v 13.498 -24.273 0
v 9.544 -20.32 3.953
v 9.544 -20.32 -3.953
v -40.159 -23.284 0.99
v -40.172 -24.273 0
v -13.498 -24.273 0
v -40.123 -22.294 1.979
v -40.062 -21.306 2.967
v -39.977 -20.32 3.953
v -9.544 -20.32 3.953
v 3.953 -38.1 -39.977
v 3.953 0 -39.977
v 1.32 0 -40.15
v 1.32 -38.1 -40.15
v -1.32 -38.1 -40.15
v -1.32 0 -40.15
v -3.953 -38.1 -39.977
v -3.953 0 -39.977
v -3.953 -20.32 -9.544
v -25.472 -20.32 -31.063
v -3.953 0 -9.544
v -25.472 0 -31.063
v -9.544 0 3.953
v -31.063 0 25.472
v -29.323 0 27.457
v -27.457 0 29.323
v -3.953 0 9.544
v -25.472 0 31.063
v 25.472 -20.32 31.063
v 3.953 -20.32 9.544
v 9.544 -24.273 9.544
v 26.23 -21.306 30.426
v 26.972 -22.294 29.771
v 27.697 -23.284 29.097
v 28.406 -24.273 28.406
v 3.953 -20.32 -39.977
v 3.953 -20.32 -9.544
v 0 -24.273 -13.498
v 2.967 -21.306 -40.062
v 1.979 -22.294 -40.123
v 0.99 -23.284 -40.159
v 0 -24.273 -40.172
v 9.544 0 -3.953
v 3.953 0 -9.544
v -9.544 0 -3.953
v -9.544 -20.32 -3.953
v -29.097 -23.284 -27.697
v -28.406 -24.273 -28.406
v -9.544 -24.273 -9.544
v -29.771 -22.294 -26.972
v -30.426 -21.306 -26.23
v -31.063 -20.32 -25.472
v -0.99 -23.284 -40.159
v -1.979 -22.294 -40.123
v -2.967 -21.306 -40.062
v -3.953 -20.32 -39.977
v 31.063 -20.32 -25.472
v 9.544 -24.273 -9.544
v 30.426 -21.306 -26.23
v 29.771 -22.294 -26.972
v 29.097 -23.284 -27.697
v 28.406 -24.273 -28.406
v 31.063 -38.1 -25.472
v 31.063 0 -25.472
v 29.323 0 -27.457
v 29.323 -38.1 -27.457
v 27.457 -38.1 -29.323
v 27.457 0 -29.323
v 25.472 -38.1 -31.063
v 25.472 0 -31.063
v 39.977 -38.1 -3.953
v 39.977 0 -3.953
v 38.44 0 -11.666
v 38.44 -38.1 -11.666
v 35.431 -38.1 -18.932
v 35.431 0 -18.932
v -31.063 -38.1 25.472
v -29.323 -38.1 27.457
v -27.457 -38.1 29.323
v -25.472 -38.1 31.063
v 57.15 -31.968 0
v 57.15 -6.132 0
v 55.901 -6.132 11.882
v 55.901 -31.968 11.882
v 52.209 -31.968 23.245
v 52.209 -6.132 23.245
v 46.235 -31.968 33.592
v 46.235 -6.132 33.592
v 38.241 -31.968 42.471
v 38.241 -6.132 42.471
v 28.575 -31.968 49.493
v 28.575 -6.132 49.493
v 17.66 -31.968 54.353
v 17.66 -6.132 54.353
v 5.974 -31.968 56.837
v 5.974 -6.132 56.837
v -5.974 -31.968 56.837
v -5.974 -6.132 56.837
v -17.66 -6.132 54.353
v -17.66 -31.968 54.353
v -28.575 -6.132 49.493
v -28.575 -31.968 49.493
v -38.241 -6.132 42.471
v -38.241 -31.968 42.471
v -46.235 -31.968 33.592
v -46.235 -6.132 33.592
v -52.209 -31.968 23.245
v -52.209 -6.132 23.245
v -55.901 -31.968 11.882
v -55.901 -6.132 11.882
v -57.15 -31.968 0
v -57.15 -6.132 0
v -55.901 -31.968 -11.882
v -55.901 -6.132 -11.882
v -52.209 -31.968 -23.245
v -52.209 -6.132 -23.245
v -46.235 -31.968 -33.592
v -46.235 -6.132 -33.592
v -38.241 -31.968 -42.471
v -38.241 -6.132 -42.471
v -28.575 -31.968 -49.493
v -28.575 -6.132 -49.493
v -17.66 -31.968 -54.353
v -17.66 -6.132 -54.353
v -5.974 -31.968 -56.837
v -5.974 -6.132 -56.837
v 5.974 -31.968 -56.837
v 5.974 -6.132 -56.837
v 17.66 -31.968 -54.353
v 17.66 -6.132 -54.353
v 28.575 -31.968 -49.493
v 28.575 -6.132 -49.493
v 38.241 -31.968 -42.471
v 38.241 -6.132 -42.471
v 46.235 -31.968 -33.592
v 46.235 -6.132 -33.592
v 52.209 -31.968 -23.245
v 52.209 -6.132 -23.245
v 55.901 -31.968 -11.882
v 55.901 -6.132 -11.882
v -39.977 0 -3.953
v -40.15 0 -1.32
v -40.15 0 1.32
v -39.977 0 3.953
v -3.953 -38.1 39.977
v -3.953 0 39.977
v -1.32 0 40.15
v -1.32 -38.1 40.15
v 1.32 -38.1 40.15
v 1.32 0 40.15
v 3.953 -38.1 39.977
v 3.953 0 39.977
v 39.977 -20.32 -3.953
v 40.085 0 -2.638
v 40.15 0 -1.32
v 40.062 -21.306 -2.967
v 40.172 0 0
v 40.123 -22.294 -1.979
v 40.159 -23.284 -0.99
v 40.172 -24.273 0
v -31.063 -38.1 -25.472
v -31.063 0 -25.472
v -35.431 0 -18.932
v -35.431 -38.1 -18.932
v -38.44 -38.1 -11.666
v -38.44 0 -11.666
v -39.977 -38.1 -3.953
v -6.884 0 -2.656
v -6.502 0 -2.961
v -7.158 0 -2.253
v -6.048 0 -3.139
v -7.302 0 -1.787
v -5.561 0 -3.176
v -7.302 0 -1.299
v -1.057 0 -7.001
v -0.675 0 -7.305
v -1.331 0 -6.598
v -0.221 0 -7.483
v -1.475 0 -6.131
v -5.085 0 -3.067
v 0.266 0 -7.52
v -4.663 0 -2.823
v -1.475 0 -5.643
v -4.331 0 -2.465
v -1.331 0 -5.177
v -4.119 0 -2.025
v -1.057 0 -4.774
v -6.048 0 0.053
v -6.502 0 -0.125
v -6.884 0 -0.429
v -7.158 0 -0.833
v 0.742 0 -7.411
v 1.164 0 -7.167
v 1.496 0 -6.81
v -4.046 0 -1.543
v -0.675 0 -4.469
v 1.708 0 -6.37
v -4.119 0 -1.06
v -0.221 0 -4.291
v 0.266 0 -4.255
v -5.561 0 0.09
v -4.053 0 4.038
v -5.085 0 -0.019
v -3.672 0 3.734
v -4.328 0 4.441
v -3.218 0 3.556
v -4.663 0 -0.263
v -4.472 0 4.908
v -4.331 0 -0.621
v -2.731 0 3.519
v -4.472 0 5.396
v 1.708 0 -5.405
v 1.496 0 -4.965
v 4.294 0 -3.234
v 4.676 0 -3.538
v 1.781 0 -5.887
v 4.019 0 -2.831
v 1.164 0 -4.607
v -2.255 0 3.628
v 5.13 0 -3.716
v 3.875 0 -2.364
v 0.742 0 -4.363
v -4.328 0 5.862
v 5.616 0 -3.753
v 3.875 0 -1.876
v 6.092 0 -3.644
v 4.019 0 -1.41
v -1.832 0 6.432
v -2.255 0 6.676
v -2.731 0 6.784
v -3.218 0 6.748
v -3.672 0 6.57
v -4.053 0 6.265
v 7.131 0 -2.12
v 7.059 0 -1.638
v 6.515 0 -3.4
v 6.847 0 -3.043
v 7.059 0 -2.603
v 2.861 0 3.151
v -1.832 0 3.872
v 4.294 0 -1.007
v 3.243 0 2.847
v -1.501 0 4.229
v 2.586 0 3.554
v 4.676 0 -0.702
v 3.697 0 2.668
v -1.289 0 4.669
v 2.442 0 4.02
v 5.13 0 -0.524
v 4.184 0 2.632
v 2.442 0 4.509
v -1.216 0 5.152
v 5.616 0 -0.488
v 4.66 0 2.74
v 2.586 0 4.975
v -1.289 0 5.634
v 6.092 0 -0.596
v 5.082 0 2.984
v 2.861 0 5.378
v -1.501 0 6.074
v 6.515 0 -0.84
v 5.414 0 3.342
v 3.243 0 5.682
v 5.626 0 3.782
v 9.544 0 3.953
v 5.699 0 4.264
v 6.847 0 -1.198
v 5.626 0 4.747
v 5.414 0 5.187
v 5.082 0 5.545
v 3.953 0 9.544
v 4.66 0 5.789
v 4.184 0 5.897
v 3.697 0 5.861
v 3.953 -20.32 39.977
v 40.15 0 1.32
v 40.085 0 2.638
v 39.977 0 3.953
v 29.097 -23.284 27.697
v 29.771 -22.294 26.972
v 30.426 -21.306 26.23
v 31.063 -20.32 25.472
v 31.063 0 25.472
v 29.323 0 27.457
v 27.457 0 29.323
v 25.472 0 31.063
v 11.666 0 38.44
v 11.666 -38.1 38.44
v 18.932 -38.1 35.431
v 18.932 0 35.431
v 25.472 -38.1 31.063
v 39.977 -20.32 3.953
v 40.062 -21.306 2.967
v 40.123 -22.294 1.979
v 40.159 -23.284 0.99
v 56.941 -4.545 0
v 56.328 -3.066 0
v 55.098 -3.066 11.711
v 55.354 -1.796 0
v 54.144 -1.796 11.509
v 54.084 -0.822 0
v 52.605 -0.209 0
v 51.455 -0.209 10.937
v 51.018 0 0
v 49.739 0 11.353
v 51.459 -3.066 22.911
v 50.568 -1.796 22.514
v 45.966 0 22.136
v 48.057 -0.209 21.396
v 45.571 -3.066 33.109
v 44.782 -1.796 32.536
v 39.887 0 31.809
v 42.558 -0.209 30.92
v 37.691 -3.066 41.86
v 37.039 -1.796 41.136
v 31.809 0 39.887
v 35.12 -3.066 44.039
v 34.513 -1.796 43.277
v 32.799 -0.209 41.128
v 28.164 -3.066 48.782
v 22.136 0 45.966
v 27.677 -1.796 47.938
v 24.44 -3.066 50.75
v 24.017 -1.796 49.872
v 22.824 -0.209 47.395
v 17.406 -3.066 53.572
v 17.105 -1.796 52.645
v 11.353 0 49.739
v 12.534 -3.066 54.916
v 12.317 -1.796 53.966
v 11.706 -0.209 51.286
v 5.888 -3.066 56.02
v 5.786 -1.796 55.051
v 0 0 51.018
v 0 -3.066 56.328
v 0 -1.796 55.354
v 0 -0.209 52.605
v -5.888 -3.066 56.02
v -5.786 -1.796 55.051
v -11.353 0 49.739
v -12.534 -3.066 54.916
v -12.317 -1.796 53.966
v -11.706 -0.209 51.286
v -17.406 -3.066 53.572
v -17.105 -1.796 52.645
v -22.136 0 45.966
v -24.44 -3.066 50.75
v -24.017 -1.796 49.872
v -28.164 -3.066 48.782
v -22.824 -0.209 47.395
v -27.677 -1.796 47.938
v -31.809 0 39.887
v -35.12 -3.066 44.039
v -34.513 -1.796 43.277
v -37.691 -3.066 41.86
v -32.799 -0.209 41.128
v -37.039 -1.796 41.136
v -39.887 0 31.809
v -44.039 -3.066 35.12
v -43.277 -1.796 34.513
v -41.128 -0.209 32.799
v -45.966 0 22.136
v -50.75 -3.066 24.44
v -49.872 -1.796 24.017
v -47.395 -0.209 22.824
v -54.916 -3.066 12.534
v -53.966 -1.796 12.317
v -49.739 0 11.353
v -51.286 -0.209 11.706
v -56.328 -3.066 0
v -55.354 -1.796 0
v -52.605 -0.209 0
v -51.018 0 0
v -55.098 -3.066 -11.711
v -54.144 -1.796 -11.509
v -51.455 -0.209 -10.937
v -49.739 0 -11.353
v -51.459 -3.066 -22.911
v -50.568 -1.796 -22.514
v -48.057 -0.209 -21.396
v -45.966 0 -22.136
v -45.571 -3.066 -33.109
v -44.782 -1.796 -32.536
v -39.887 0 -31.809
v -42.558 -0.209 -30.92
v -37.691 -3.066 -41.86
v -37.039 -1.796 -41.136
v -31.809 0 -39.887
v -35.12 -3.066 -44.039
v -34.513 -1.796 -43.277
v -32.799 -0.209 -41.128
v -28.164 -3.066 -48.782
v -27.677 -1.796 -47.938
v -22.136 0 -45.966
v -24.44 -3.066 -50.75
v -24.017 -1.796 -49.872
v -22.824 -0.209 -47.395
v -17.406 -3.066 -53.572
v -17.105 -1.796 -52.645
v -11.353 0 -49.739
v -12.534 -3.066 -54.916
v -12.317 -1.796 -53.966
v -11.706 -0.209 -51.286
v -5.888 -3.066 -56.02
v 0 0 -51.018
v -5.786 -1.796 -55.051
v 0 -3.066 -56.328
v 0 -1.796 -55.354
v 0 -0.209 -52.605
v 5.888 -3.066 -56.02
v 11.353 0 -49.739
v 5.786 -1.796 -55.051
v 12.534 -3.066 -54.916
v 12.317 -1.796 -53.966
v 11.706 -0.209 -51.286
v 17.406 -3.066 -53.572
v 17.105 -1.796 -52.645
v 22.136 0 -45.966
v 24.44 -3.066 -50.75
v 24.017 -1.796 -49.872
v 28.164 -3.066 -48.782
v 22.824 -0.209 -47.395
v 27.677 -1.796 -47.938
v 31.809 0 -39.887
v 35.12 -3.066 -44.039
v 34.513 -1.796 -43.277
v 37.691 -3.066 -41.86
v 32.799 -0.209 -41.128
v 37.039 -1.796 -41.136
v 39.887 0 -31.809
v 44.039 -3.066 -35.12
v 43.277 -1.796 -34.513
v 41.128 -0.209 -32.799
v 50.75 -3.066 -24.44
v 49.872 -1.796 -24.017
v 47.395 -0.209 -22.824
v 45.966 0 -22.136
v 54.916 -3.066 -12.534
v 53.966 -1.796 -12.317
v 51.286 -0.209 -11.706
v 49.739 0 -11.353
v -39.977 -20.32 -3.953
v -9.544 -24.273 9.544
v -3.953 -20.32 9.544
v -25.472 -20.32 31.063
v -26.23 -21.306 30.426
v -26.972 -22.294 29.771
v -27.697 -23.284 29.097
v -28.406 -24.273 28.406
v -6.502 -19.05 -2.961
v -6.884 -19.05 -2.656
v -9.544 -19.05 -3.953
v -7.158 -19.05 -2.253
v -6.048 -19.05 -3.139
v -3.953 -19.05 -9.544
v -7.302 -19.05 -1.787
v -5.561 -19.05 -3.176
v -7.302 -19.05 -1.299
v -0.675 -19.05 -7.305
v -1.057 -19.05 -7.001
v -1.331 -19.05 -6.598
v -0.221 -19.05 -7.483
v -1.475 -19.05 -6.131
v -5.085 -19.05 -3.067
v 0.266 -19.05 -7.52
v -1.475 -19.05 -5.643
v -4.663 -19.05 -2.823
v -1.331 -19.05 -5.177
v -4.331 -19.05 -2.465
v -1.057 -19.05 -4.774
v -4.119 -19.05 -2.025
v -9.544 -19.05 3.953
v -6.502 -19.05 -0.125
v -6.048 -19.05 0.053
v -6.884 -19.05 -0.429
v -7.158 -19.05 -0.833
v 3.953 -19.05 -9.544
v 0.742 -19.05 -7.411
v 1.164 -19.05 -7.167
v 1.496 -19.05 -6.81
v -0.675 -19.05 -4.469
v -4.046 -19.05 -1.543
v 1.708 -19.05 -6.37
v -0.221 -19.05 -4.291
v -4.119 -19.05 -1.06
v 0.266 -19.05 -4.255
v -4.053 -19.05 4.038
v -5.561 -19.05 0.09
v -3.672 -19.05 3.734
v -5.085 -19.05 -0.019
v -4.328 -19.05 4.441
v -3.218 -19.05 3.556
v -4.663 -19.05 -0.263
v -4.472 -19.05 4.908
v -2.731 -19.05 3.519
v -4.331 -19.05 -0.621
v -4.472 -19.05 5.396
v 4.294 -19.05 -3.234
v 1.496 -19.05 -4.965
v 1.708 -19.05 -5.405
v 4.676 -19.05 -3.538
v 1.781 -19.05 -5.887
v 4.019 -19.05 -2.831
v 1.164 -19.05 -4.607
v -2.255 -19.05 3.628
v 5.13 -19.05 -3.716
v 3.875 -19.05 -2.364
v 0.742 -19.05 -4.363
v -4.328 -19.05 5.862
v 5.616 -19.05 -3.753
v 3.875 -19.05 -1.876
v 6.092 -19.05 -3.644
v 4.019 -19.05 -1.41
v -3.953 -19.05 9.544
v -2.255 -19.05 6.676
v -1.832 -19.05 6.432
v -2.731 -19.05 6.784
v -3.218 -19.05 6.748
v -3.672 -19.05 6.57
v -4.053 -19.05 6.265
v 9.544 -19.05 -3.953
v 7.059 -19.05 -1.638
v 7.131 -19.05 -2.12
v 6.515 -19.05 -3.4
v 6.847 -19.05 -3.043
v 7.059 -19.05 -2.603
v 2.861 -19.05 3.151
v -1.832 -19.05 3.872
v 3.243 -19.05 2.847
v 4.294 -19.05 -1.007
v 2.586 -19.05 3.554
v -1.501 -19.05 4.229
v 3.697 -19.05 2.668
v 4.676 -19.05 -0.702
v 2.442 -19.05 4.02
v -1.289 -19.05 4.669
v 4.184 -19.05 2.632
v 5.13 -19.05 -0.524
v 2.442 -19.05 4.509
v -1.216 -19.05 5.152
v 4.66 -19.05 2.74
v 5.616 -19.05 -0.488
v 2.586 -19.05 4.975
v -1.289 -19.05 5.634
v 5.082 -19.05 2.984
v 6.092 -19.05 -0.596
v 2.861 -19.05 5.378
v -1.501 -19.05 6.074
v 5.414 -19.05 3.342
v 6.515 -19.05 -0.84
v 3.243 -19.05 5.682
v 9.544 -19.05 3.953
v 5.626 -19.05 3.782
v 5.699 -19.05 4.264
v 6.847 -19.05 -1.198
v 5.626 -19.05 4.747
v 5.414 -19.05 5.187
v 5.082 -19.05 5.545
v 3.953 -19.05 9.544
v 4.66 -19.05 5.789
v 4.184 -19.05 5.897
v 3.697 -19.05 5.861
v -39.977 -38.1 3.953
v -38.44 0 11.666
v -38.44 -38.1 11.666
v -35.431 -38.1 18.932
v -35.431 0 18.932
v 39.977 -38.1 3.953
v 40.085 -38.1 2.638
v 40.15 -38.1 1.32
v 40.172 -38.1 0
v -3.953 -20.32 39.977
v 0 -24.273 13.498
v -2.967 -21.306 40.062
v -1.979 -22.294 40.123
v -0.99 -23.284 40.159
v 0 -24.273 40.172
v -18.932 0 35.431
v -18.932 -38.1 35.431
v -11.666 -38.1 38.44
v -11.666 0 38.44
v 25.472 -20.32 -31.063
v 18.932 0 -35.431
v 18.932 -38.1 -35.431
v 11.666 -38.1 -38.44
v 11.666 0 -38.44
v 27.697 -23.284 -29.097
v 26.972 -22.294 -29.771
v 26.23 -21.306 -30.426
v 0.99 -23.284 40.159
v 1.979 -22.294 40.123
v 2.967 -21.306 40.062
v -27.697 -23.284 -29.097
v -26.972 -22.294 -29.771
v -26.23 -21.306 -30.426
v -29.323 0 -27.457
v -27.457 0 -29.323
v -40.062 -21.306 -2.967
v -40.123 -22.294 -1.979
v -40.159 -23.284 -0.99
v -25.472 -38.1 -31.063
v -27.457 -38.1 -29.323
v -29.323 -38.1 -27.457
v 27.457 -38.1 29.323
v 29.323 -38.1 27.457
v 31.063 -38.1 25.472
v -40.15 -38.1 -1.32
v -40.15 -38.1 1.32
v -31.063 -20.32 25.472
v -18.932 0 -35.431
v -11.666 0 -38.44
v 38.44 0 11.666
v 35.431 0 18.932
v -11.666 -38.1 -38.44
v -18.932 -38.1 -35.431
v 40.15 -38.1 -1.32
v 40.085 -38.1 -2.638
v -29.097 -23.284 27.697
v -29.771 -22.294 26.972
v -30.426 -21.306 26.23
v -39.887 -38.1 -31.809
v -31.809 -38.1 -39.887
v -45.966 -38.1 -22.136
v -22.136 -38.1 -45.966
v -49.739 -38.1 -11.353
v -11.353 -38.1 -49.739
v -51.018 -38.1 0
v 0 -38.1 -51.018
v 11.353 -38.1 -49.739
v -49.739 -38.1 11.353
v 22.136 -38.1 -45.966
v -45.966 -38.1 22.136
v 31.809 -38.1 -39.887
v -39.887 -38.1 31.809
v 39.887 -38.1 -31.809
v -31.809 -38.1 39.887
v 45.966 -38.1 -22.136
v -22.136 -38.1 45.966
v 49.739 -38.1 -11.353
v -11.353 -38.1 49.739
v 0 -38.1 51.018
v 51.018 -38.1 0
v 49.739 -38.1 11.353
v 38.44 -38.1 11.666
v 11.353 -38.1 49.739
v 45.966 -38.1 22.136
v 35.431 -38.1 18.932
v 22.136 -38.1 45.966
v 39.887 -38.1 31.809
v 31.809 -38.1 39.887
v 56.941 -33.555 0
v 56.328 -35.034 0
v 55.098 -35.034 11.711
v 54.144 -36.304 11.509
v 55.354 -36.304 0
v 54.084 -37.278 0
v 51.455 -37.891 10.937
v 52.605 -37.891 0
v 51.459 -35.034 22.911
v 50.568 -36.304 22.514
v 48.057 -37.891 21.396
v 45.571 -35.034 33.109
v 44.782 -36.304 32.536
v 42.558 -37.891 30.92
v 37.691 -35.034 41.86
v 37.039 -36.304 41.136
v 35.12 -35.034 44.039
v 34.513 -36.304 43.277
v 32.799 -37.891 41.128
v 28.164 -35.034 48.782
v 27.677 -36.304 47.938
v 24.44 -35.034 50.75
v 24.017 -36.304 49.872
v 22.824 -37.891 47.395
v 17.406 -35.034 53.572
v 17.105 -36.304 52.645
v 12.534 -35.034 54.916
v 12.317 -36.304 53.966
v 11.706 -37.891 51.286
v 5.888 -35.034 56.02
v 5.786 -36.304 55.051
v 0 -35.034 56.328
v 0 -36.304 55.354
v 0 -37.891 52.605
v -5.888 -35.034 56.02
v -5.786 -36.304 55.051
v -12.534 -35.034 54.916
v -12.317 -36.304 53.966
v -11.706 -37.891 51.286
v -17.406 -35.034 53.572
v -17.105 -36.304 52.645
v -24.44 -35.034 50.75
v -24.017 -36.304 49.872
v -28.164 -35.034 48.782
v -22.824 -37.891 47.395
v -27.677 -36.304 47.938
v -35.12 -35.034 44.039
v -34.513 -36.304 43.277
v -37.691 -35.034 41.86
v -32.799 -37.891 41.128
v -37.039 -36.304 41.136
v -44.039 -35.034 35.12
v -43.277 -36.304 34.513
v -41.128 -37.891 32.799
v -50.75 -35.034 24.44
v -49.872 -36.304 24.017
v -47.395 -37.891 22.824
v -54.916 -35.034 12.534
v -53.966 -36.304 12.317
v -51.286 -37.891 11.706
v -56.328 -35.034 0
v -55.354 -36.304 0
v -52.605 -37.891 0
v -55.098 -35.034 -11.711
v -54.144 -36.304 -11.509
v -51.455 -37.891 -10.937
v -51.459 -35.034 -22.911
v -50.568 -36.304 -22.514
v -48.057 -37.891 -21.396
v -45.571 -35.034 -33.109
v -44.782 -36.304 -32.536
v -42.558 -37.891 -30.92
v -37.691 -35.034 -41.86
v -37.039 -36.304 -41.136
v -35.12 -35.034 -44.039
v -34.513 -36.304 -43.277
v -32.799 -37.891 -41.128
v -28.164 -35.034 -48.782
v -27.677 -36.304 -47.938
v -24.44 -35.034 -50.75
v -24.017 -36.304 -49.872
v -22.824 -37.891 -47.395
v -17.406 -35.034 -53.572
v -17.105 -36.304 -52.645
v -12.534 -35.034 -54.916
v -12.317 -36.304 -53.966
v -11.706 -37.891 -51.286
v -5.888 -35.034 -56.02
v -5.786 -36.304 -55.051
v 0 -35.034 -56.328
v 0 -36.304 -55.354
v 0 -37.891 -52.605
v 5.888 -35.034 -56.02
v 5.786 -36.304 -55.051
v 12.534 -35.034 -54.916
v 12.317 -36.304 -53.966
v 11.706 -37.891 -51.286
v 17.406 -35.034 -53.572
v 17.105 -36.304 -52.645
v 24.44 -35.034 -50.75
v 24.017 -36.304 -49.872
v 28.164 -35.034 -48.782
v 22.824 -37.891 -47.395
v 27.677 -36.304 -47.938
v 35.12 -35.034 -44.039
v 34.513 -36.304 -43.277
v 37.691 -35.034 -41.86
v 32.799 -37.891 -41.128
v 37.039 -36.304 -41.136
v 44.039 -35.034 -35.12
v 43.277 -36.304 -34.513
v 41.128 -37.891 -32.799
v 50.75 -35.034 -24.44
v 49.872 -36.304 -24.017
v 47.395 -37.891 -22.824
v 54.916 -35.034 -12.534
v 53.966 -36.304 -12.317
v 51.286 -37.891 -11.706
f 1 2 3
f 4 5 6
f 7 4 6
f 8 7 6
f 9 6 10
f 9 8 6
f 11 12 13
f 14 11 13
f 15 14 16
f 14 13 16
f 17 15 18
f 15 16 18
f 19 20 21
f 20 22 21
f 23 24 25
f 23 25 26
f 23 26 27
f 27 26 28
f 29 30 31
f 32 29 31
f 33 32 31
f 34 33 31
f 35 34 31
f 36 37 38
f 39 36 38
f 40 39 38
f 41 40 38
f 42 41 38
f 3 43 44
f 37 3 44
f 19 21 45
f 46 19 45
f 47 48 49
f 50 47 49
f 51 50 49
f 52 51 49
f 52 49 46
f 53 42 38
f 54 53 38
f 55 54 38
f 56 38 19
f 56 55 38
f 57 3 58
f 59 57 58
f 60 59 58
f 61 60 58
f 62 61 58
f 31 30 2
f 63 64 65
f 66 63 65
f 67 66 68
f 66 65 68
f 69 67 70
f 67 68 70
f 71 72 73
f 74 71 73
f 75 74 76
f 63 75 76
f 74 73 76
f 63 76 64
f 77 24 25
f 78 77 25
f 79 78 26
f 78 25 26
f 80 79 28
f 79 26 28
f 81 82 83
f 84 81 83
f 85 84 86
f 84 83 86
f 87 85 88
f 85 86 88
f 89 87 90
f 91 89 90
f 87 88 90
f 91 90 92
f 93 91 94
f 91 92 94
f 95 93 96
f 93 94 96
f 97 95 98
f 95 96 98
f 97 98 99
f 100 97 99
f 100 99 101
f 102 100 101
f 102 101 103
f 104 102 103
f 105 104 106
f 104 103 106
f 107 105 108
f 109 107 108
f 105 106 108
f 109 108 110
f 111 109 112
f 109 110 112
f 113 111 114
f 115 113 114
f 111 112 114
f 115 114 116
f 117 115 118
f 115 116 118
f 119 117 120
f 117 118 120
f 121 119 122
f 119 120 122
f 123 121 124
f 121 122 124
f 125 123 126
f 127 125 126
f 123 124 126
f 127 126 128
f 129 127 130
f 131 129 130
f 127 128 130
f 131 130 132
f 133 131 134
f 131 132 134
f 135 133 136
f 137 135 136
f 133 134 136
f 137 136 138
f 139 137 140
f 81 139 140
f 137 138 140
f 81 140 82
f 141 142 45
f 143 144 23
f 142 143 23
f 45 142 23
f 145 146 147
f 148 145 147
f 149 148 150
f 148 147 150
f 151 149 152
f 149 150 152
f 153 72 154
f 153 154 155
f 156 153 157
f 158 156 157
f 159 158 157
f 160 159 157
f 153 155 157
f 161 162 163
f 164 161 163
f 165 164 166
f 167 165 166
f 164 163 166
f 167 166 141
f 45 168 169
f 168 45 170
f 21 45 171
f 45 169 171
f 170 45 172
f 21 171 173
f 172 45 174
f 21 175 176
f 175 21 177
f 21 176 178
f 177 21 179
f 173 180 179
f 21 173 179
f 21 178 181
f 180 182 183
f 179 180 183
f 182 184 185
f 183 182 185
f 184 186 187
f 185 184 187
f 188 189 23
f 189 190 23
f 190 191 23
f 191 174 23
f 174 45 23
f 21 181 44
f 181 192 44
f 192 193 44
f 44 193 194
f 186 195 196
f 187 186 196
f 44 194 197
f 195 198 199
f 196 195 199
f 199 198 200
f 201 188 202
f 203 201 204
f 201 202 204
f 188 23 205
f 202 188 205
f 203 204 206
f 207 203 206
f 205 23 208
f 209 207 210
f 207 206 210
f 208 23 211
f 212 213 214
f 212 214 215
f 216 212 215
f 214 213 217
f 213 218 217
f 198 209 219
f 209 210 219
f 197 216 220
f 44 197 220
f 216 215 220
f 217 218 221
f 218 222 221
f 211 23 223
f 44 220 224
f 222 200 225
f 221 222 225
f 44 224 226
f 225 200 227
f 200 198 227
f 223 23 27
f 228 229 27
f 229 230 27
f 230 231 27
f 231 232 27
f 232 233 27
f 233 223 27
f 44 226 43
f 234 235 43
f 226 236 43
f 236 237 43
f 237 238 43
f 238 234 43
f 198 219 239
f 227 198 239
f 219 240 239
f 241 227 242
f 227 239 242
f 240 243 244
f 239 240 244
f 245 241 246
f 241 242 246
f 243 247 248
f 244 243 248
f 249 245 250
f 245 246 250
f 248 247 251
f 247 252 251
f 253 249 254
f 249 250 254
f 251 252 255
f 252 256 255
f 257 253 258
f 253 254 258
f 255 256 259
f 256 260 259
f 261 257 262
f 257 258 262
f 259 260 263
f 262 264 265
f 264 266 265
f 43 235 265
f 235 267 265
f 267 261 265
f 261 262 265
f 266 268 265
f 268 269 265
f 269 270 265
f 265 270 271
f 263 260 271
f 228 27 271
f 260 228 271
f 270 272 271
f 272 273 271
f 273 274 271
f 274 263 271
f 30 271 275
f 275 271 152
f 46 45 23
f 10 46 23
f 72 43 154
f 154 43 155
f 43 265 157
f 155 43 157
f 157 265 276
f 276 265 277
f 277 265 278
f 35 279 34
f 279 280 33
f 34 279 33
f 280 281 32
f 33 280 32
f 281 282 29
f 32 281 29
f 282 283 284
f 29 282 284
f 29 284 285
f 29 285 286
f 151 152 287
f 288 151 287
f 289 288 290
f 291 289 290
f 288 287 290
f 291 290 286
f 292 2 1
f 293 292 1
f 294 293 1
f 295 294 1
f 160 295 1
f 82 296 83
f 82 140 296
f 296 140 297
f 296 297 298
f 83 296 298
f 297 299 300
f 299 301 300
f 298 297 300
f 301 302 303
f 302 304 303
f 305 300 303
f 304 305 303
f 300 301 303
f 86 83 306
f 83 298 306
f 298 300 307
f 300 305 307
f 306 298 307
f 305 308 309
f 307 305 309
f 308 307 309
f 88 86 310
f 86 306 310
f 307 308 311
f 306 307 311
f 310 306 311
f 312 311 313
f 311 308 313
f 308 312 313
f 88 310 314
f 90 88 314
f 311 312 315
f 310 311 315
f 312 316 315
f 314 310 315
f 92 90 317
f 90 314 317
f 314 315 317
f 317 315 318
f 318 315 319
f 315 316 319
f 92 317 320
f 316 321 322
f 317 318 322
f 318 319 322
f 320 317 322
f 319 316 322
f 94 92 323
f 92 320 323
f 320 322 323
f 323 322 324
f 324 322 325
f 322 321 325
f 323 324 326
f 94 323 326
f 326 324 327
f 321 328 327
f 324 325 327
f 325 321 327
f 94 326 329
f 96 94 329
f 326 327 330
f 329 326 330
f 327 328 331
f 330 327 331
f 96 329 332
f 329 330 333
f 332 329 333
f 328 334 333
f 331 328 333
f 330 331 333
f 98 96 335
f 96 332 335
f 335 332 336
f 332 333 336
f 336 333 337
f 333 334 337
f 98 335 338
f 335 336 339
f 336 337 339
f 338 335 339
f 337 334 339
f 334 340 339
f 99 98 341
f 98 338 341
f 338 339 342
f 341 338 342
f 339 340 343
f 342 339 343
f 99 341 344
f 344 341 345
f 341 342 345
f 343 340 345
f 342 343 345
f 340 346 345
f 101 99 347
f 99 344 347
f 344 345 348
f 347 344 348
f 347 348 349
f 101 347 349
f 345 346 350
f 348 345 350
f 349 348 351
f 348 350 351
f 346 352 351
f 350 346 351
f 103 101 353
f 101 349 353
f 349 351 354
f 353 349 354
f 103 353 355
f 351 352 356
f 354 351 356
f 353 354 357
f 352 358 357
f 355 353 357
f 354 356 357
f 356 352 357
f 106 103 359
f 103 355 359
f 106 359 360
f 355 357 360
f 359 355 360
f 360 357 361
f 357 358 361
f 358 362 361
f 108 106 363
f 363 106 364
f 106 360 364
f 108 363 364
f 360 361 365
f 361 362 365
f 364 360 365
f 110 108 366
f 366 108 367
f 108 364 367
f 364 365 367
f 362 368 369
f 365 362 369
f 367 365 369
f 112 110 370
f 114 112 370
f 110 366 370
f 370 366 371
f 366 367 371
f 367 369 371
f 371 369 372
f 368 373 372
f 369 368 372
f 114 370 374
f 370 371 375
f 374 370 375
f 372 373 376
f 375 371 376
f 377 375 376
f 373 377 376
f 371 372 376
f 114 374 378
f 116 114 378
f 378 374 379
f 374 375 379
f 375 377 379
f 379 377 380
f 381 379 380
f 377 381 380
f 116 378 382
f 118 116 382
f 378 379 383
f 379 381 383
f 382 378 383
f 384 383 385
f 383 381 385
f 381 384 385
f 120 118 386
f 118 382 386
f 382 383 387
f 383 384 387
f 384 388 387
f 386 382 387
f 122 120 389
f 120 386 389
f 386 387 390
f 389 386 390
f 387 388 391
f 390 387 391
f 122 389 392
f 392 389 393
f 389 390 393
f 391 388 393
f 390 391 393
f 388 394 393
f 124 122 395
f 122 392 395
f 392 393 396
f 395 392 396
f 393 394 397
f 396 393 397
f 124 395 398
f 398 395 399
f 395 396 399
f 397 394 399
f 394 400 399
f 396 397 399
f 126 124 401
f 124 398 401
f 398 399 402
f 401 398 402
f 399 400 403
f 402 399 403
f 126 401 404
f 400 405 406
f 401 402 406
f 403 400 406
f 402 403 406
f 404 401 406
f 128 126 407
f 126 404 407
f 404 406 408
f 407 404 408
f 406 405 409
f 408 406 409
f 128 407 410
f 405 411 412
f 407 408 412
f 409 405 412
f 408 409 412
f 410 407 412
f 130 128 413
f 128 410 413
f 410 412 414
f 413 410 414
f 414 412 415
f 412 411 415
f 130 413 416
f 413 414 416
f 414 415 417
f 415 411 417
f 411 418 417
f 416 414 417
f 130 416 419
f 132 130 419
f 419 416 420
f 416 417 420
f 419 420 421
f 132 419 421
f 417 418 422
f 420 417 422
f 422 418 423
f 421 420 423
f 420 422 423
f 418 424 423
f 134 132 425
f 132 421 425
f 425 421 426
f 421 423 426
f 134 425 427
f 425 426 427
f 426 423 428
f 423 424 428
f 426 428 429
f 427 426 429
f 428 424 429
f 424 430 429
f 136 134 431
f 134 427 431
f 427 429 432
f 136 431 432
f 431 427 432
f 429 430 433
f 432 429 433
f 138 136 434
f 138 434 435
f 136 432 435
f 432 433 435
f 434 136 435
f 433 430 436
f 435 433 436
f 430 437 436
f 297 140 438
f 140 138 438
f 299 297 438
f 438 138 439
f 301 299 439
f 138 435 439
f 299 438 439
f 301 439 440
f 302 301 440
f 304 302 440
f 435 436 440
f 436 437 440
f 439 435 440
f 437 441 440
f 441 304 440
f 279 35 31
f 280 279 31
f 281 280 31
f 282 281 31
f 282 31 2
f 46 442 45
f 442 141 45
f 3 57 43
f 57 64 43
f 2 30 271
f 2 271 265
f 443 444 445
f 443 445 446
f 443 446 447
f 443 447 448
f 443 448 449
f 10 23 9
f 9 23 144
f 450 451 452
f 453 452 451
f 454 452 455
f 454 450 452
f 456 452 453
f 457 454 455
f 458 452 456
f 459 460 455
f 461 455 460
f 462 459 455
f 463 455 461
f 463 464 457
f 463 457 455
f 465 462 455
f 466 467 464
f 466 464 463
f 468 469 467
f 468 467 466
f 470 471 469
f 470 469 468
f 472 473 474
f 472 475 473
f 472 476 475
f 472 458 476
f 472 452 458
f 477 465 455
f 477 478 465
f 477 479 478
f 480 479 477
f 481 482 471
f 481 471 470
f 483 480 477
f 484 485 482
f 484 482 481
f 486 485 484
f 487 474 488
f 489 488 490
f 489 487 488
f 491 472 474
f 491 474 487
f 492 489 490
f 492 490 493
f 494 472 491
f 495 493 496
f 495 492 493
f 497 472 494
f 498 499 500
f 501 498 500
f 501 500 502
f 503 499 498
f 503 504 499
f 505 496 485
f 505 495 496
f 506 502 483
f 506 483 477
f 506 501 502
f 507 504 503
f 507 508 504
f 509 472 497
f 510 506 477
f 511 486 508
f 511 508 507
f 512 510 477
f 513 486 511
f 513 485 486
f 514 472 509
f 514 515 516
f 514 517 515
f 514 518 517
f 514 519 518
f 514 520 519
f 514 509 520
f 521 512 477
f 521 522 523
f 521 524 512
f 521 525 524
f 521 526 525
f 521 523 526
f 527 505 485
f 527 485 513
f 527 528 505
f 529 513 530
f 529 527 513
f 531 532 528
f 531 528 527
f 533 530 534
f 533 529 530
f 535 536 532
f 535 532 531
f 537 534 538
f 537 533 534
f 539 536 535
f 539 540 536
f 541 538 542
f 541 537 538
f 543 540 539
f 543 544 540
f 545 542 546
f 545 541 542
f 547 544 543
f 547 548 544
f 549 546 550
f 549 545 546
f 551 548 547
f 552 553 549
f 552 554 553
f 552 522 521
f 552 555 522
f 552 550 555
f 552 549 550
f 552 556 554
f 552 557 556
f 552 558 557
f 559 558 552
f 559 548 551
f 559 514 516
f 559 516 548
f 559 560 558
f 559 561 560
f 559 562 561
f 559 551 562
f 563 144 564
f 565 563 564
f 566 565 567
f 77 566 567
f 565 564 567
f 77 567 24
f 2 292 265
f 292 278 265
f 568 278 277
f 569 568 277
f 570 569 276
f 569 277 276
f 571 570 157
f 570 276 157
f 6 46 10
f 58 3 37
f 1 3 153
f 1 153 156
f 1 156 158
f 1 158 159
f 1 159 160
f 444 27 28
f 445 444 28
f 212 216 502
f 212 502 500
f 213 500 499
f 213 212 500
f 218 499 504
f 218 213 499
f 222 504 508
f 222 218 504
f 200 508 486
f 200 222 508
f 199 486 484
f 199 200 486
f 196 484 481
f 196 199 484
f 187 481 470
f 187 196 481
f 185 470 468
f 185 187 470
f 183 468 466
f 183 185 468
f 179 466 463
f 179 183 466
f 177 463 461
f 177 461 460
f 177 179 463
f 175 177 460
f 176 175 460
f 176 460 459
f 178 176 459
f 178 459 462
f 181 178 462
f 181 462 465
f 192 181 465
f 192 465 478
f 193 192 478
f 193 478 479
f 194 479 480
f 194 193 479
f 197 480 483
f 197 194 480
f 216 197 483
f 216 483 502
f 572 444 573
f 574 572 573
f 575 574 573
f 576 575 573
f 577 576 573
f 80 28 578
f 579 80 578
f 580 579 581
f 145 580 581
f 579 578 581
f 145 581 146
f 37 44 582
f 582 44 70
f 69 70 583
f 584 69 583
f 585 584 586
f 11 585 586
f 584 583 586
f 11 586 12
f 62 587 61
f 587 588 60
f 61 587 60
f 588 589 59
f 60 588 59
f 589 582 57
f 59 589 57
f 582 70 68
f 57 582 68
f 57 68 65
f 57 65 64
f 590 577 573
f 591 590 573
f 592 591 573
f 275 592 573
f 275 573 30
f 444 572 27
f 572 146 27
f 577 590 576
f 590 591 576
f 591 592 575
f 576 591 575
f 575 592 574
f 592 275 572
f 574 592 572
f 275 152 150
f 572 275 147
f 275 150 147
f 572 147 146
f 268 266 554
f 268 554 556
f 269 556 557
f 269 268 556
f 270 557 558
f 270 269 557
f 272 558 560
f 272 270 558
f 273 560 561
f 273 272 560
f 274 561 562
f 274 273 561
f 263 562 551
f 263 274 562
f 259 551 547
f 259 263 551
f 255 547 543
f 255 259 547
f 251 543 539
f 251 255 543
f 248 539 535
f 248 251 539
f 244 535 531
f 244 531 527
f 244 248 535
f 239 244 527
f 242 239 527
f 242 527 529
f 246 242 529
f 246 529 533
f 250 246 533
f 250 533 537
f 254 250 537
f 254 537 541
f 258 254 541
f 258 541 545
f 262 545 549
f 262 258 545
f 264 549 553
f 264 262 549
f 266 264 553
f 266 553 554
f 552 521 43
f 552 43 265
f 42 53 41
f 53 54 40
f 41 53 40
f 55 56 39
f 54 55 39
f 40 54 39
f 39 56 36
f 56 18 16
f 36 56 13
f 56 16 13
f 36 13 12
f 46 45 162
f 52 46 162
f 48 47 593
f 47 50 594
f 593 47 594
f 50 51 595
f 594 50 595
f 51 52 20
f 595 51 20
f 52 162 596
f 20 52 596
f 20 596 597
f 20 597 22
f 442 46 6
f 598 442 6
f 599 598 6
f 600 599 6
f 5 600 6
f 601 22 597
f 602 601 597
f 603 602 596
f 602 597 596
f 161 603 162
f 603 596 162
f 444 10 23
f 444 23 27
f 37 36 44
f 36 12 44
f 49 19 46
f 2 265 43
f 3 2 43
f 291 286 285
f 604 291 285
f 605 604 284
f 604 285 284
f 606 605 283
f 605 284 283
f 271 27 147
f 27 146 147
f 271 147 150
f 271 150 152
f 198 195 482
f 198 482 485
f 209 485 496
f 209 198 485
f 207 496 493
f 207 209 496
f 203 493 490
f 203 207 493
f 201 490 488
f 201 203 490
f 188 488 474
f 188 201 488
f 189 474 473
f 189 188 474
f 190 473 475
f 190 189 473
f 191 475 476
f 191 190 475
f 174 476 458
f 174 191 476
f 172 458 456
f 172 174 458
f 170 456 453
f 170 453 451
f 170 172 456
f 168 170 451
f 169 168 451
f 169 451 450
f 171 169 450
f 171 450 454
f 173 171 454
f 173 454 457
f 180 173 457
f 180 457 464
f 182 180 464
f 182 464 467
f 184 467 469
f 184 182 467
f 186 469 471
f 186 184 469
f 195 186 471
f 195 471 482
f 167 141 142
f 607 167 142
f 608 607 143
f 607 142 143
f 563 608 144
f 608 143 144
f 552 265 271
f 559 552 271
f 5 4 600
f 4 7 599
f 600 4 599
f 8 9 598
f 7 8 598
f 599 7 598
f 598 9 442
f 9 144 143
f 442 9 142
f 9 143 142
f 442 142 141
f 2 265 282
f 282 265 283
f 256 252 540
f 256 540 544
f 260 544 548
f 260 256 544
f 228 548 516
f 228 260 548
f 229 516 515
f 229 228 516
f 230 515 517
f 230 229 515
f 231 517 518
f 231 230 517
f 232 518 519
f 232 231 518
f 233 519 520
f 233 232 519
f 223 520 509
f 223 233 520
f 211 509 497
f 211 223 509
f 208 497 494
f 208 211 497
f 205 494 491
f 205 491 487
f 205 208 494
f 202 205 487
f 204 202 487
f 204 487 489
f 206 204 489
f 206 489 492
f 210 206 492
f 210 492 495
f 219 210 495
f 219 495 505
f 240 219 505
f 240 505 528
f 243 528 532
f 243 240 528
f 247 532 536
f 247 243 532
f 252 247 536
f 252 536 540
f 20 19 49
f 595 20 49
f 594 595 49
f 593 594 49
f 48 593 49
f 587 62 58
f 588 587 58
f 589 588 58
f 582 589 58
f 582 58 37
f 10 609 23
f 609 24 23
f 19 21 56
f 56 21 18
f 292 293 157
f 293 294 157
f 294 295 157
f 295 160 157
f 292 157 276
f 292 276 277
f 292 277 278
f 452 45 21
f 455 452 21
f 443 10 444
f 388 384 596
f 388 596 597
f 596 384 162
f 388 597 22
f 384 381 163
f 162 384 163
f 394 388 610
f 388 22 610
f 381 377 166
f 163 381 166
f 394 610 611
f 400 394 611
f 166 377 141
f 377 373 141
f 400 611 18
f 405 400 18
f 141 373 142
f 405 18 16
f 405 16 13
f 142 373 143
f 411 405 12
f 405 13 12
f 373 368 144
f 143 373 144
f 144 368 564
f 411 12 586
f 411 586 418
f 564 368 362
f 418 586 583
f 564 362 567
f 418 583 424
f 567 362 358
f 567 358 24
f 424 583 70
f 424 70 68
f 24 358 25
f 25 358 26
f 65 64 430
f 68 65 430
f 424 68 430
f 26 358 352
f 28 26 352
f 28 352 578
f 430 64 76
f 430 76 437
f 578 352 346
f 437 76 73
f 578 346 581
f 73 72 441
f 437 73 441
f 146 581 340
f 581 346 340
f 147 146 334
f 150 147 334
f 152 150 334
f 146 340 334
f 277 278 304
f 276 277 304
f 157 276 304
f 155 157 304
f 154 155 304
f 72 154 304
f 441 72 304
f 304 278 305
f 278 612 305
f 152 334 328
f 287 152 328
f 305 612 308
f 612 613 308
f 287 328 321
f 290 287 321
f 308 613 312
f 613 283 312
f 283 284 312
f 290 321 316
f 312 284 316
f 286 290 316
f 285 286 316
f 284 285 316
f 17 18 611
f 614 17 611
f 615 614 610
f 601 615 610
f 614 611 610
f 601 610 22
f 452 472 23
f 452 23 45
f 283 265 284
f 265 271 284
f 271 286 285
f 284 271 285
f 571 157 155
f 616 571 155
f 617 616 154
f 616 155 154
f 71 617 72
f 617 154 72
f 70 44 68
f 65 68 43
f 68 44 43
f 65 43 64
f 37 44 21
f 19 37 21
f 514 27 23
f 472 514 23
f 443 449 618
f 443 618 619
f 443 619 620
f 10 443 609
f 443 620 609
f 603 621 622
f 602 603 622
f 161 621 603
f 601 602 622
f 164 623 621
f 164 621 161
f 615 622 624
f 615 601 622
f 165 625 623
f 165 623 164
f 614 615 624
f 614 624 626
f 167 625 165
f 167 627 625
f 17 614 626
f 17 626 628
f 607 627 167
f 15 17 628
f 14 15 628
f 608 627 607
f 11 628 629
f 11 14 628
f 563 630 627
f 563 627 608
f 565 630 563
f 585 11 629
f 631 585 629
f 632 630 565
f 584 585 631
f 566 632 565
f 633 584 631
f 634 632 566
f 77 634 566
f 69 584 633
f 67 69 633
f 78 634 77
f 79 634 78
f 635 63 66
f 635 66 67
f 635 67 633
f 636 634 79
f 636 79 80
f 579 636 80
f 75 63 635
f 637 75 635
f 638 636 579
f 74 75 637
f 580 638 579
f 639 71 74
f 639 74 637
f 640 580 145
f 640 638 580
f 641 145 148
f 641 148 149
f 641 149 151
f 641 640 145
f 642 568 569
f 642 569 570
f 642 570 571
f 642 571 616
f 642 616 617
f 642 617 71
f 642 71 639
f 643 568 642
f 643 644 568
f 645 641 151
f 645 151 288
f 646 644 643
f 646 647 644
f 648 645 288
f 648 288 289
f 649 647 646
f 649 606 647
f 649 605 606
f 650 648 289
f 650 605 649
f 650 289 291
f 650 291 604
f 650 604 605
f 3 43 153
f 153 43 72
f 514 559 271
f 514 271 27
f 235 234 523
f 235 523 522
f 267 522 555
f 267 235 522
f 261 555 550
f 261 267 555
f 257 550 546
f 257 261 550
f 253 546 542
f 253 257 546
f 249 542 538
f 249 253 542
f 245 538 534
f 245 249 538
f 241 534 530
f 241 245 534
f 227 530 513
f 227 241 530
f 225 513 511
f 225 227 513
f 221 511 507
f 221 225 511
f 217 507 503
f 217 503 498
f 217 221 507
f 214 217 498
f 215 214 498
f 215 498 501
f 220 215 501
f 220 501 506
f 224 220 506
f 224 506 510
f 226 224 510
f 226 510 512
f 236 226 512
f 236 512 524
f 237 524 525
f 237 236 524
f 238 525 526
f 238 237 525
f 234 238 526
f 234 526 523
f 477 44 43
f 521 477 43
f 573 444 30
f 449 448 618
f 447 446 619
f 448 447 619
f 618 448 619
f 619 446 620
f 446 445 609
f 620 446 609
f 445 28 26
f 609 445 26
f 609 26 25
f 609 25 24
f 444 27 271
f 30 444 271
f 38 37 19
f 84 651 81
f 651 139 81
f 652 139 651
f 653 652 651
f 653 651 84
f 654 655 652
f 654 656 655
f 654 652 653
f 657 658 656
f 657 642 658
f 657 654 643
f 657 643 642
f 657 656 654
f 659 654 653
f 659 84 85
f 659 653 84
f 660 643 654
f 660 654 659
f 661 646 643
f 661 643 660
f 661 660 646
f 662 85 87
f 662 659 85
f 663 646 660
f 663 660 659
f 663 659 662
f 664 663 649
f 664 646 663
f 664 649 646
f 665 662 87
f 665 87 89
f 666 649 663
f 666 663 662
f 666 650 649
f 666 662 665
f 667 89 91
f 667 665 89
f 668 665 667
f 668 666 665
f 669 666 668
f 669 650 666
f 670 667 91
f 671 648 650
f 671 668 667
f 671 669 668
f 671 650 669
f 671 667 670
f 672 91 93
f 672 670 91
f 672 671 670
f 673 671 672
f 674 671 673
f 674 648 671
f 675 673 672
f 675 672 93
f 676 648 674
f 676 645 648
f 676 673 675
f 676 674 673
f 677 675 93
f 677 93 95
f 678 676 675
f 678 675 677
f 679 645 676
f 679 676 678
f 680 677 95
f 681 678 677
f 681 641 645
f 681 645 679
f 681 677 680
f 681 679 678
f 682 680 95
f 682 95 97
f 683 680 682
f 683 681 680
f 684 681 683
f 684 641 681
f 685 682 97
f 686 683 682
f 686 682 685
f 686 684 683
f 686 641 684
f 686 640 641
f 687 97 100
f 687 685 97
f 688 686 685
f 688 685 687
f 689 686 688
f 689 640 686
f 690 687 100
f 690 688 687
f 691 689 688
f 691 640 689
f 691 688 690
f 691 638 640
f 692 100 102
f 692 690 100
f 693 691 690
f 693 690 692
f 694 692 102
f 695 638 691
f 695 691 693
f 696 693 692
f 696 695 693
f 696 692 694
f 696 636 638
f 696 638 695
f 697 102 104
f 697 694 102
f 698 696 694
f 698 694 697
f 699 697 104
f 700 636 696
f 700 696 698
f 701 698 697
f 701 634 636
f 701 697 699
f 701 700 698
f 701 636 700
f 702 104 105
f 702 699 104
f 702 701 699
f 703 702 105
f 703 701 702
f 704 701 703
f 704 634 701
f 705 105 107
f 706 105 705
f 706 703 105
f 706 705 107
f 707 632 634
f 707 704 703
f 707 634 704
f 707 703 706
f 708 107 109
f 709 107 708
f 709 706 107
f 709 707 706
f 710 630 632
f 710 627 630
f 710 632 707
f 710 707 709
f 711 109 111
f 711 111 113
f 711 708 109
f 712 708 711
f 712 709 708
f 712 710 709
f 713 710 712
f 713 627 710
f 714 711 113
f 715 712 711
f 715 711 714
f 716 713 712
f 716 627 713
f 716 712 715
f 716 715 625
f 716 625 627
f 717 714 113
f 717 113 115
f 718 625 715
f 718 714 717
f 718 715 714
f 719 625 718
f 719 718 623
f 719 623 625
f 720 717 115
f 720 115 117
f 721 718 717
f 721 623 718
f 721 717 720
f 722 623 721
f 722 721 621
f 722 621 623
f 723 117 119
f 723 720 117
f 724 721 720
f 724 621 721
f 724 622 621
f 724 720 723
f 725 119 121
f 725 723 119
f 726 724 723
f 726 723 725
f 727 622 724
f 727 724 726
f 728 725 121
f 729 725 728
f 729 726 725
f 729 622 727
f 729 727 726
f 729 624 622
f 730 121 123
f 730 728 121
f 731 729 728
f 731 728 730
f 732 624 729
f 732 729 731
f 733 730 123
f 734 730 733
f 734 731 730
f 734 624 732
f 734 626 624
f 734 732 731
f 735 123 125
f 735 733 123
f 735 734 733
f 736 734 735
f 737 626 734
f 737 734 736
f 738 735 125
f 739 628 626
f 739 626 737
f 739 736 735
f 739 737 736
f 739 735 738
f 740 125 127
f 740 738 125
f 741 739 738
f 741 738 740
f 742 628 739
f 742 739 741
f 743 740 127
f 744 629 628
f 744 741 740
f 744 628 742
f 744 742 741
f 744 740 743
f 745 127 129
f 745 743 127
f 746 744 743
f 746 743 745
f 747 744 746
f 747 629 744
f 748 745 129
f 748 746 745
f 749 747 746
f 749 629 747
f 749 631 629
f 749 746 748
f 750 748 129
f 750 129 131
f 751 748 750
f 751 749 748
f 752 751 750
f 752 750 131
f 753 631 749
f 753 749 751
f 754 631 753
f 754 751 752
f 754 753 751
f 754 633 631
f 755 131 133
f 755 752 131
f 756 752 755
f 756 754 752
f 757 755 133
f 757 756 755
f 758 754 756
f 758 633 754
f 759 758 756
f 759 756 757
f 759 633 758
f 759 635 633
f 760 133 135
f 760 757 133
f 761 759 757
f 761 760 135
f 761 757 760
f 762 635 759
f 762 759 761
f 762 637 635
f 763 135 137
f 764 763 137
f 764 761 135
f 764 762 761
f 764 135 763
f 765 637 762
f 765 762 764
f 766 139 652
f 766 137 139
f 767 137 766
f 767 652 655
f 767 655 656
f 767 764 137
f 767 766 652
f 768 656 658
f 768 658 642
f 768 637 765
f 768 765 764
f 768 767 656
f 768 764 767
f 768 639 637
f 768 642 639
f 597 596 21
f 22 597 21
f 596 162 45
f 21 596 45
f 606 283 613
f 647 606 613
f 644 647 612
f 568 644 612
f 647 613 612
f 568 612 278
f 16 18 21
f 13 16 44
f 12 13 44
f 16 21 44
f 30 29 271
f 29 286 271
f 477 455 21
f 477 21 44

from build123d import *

# Parameters (mm, degrees)
F0_R          = 57.15
F1_DEPTH      = 38.1
F2_DEPTH      = 25.4
F0_R_2        = 1.6372110105
F3_DEPTH      = 19.05
F4_R          = 6.1321024484
F5_SIZE       = 5.08
F5_2_SIZE     = 5.08
F5_3_SIZE     = 5.08
F5_4_SIZE     = 5.08
F5_5_SIZE     = 5.08
F5_6_SIZE     = 5.08
F5_7_SIZE     = 5.08
F5_8_SIZE     = 5.08
F6_T1_DEPTH   = 51.4806015581
F6_2_T1_DEPTH = 51.4806015581
F6_2_T3_DEPTH = 51.4806015581
F6_3_T1_DEPTH = 51.4806015581
F6_4_T1_DEPTH = 51.4806015581
F6_4_T3_DEPTH = 51.4806015581
F6_5_T1_DEPTH = 51.4806015581
F6_6_T1_DEPTH = 51.4806015581
F6_6_T3_DEPTH = 51.4806015581
F6_7_T1_DEPTH = 51.4806015581
F6_8_T1_DEPTH = 51.4806015581
F6_8_T3_DEPTH = 51.4806015581


# Not quite as in the source:
# - a fillet or chamfer that OpenCascade refuses, or shapes differently, is made with other operations: its cross-section is extruded or revolved along the edge and cut away or added


with BuildPart() as f1:
    # F0 (on Front) → F1 (new body)
    with BuildSketch(Plane.XZ):
        Circle(F0_R)
        with BuildLine():
            ThreePointArc((39.9766423626, 3.9533950563), (40.1228666372, 1.979100774), (40.1716475522, 0))
            ThreePointArc((40.1716475522, 0), (40.1228666372, -1.979100774), (39.9766423626, -3.9533950563))
            ThreePointArc((39.9766423626, -3.9533950563), (37.1137629608, -15.3730239691), (31.0632273567, -25.4722824507))
            ThreePointArc((31.0632273567, -25.4722824507), (28.4056443956, -28.4056443956), (25.4722824507, -31.0632273567))
            ThreePointArc((25.4722824507, -31.0632273567), (15.3730239691, -37.1137629608), (3.9533950563, -39.9766423626))
            ThreePointArc((3.9533950563, -39.9766423626), (0, -40.1716475522), (-3.9533950563, -39.9766423626))
            ThreePointArc((-3.9533950563, -39.9766423626), (-15.3730239691, -37.1137629608), (-25.4722824507, -31.0632273567))
            ThreePointArc((-25.4722824507, -31.0632273567), (-28.4056443956, -28.4056443956), (-31.0632273567, -25.4722824507))
            ThreePointArc((-31.0632273567, -25.4722824507), (-37.1137629608, -15.3730239691), (-39.9766423626, -3.9533950563))
            ThreePointArc((-39.9766423626, -3.9533950563), (-40.1716475522, 0), (-39.9766423626, 3.9533950563))
            ThreePointArc((-39.9766423626, 3.9533950563), (-37.1137629608, 15.3730239691), (-31.0632273567, 25.4722824507))
            ThreePointArc((-31.0632273567, 25.4722824507), (-28.4056443956, 28.4056443956), (-25.4722824507, 31.0632273567))
            ThreePointArc((-25.4722824507, 31.0632273567), (-15.3730239691, 37.1137629608), (-3.9533950563, 39.9766423626))
            ThreePointArc((-3.9533950563, 39.9766423626), (0, 40.1716475522), (3.9533950563, 39.9766423626))
            ThreePointArc((3.9533950563, 39.9766423626), (15.3730239691, 37.1137629608), (25.4722824507, 31.0632273567))
            ThreePointArc((25.4722824507, 31.0632273567), (28.4056443956, 28.4056443956), (31.0632273567, 25.4722824507))
            ThreePointArc((31.0632273567, 25.4722824507), (37.1137629608, 15.3730239691), (39.9766423626, 3.9533950563))
        make_face(mode=Mode.SUBTRACT)
    extrude(amount=F1_DEPTH)

    # F4
    f4_edges = [f1.edges().sort_by_distance(p)[0] for p in [
        (-57.15, -38.1, 0),
        (-57.15, 0, 0),
    ]]
    fillet(f4_edges, radius=F4_R)


with BuildPart() as f2:
    # F0 (on Front) → F2 (new body)
    with BuildSketch(Plane.XZ):
        with BuildLine():
            Line((-9.5443399623, -3.9533950563), (-9.5443399623, 3.9533950563))
            Line((-9.5443399623, 3.9533950563), (-39.9766423626, 3.9533950563))
            ThreePointArc((-39.9766423626, 3.9533950563), (-40.1716475522, 0), (-39.9766423626, -3.9533950563))
            Line((-39.9766423626, -3.9533950563), (-9.5443399623, -3.9533950563))
        make_face()
    extrude(amount=F2_DEPTH)

    # F5#4
    f5_4_edges = [f2.edges().sort_by_distance(p)[0] for p in [
        (-9.54434, -25.4, 0),
    ]]
    chamfer(f5_4_edges, length=F5_4_SIZE)

    # F6#3: chamfer of 5.08 on 2 edges, made by hand

    # F6_3_s2 → F6_3_t1 (cut)
    with BuildSketch(Plane.YZ.offset(-53.0407919415)):
        Polygon((-25.4, -1.1266049437), (-20.32, 3.9533950563), (-25.4, 3.9533950563), align=None)
        Polygon((-20.32, -3.9533950563), (-25.4, 1.1266049437), (-25.4, -3.9533950563), align=None)
    extrude(amount=F6_3_T1_DEPTH, mode=Mode.SUBTRACT)


with BuildPart() as f2b:
    # F0 (on Front) → F2, piece 2 (new body)
    with BuildSketch(Plane.XZ):
        with BuildLine():
            Line((-9.5443399623, 3.9533950563), (-3.9533950563, 9.5443399623))
            Line((-3.9533950563, 9.5443399623), (-25.4722824507, 31.0632273567))
            ThreePointArc((-25.4722824507, 31.0632273567), (-28.4056443956, 28.4056443956), (-31.0632273567, 25.4722824507))
            Line((-31.0632273567, 25.4722824507), (-9.5443399623, 3.9533950563))
        make_face()
    extrude(amount=F2_DEPTH)

    # F5#3
    f5_3_edges = [f2b.edges().sort_by_distance(p)[0] for p in [
        (-6.748868, -25.4, 6.748868),
    ]]
    chamfer(f5_3_edges, length=F5_3_SIZE)

    # F6#2: chamfer of 5.08 on 2 edges, made by hand

    # F6_2_s2 → F6_2_t1 (cut)
    with BuildSketch(Plane(origin=(-1.1032212001, 0, 1.1032212001), x_dir=(0, 1, 0), z_dir=(-0.7071067812, 0, 0.7071067812))):
        Polygon((-20.32, -3.9533950563), (-25.4, 1.1266049437), (-25.4, -3.9533950563), align=None)
    extrude(amount=F6_2_T1_DEPTH, mode=Mode.SUBTRACT)

    # F6_2_s4 → F6_2_t3 (cut)
    with BuildSketch(Plane(origin=(-37.5055036613, 0, 37.5055036613), x_dir=(0, 1, 0), z_dir=(0.7071067812, 0, -0.7071067812))):
        Polygon((-25.4, 1.1266049437), (-20.32, -3.9533950563), (-25.4, -3.9533950563), align=None)
    extrude(amount=F6_2_T3_DEPTH, mode=Mode.SUBTRACT)


with BuildPart() as f2c:
    # F0 (on Front) → F2, piece 3 (new body)
    with BuildSketch(Plane.XZ):
        with BuildLine():
            Line((9.5443399623, 3.9533950563), (31.0632273567, 25.4722824507))
            ThreePointArc((31.0632273567, 25.4722824507), (28.4056443956, 28.4056443956), (25.4722824507, 31.0632273567))
            Line((25.4722824507, 31.0632273567), (3.9533950563, 9.5443399623))
            Line((3.9533950563, 9.5443399623), (9.5443399623, 3.9533950563))
        make_face()
    extrude(amount=F2_DEPTH)

    # F5
    f5_edges = [f2c.edges().sort_by_distance(p)[0] for p in [
        (6.748868, -25.4, 6.748868),
    ]]
    chamfer(f5_edges, length=F5_SIZE)

    # F6#8: chamfer of 5.08 on 2 edges, made by hand

    # F6_8_s2 → F6_8_t1 (cut)
    with BuildSketch(Plane(origin=(1.1032212001, 0, 1.1032212001), x_dir=(0, 1, 0), z_dir=(0.7071067812, 0, 0.7071067812))):
        Polygon((-25.4, 1.1266049437), (-20.32, -3.9533950563), (-25.4, -3.9533950563), align=None)
    extrude(amount=F6_8_T1_DEPTH, mode=Mode.SUBTRACT)

    # F6_8_s4 → F6_8_t3 (cut)
    with BuildSketch(Plane(origin=(37.5055036613, 0, 37.5055036613), x_dir=(0, 1, 0), z_dir=(-0.7071067812, 0, -0.7071067812))):
        Polygon((-20.32, -3.9533950563), (-25.4, 1.1266049437), (-25.4, -3.9533950563), align=None)
    extrude(amount=F6_8_T3_DEPTH, mode=Mode.SUBTRACT)


with BuildPart() as f2d:
    # F0 (on Front) → F2, piece 4 (new body)
    with BuildSketch(Plane.XZ):
        with BuildLine():
            Line((-3.9533950563, 9.5443399623), (3.9533950563, 9.5443399623))
            Line((3.9533950563, 9.5443399623), (3.9533950563, 39.9766423626))
            ThreePointArc((3.9533950563, 39.9766423626), (0, 40.1716475522), (-3.9533950563, 39.9766423626))
            Line((-3.9533950563, 39.9766423626), (-3.9533950563, 9.5443399623))
        make_face()
    extrude(amount=F2_DEPTH)

    # F5#2
    f5_2_edges = [f2d.edges().sort_by_distance(p)[0] for p in [
        (0, -25.4, 9.54434),
    ]]
    chamfer(f5_2_edges, length=F5_2_SIZE)

    # F6: chamfer of 5.08 on 2 edges, made by hand

    # F6_s2 → F6_t1 (cut)
    with BuildSketch(Plane.XY.offset(1.5601903834)):
        Polygon((-3.9533950563, -20.32), (1.1266049437, -25.4), (-3.9533950563, -25.4), align=None)
        Polygon((-1.1266049437, -25.4), (3.9533950563, -20.32), (3.9533950563, -25.4), align=None)
    extrude(amount=F6_T1_DEPTH, mode=Mode.SUBTRACT)


with BuildPart() as f2e:
    # F0 (on Front) → F2, piece 5 (new body)
    with BuildSketch(Plane.XZ):
        with BuildLine():
            ThreePointArc((39.9766423626, -3.9533950563), (40.1228666372, -1.979100774), (40.1716475522, 0))
            ThreePointArc((40.1716475522, 0), (40.1228666372, 1.979100774), (39.9766423626, 3.9533950563))
            Line((39.9766423626, 3.9533950563), (9.5443399623, 3.9533950563))
            Line((9.5443399623, 3.9533950563), (9.5443399623, -3.9533950563))
            Line((9.5443399623, -3.9533950563), (39.9766423626, -3.9533950563))
        make_face()
    extrude(amount=F2_DEPTH)

    # F5#8
    f5_8_edges = [f2e.edges().sort_by_distance(p)[0] for p in [
        (9.54434, -25.4, 0),
    ]]
    chamfer(f5_8_edges, length=F5_8_SIZE)

    # F6#7: chamfer of 5.08 on 2 edges, made by hand

    # F6_7_s2 → F6_7_t1 (cut)
    with BuildSketch(Plane.YZ.offset(1.5601903834)):
        Polygon((-20.32, -3.9533950563), (-25.4, 1.1266049437), (-25.4, -3.9533950563), align=None)
        Polygon((-20.32, 3.9533950563), (-25.4, -1.1266049437), (-25.4, 3.9533950563), align=None)
    extrude(amount=F6_7_T1_DEPTH, mode=Mode.SUBTRACT)


with BuildPart() as f2f:
    # F0 (on Front) → F2, piece 6 (new body)
    with BuildSketch(Plane.XZ):
        with BuildLine():
            ThreePointArc((25.4722824507, -31.0632273567), (28.4056443956, -28.4056443956), (31.0632273567, -25.4722824507))
            Line((31.0632273567, -25.4722824507), (9.5443399623, -3.9533950563))
            Line((9.5443399623, -3.9533950563), (3.9533950563, -9.5443399623))
            Line((3.9533950563, -9.5443399623), (25.4722824507, -31.0632273567))
        make_face()
    extrude(amount=F2_DEPTH)

    # F5#7
    f5_7_edges = [f2f.edges().sort_by_distance(p)[0] for p in [
        (6.748868, -25.4, -6.748868),
    ]]
    chamfer(f5_7_edges, length=F5_7_SIZE)

    # F6#6: chamfer of 5.08 on 2 edges, made by hand

    # F6_6_s2 → F6_6_t1 (cut)
    with BuildSketch(Plane(origin=(1.1032212001, 0, -1.1032212001), x_dir=(0, 1, 0), z_dir=(0.7071067812, 0, -0.7071067812))):
        Polygon((-25.4, 1.1266049437), (-20.32, -3.9533950563), (-25.4, -3.9533950563), align=None)
    extrude(amount=F6_6_T1_DEPTH, mode=Mode.SUBTRACT)

    # F6_6_s4 → F6_6_t3 (cut)
    with BuildSketch(Plane(origin=(37.5055036613, 0, -37.5055036613), x_dir=(0, 1, 0), z_dir=(-0.7071067812, 0, 0.7071067812))):
        Polygon((-20.32, -3.9533950563), (-25.4, 1.1266049437), (-25.4, -3.9533950563), align=None)
    extrude(amount=F6_6_T3_DEPTH, mode=Mode.SUBTRACT)


with BuildPart() as f2g:
    # F0 (on Front) → F2, piece 7 (new body)
    with BuildSketch(Plane.XZ):
        with BuildLine():
            Line((3.9533950563, -39.9766423626), (3.9533950563, -9.5443399623))
            Line((3.9533950563, -9.5443399623), (-3.9533950563, -9.5443399623))
            Line((-3.9533950563, -9.5443399623), (-3.9533950563, -39.9766423626))
            ThreePointArc((-3.9533950563, -39.9766423626), (0, -40.1716475522), (3.9533950563, -39.9766423626))
        make_face()
    extrude(amount=F2_DEPTH)

    # F5#6
    f5_6_edges = [f2g.edges().sort_by_distance(p)[0] for p in [
        (0, -25.4, -9.54434),
    ]]
    chamfer(f5_6_edges, length=F5_6_SIZE)

    # F6#5: chamfer of 5.08 on 2 edges, made by hand

    # F6_5_s2 → F6_5_t1 (cut)
    with BuildSketch(Plane.XY.offset(-53.0407919415)):
        Polygon((1.1266049437, -25.4), (-3.9533950563, -20.32), (-3.9533950563, -25.4), align=None)
        Polygon((3.9533950563, -20.32), (-1.1266049437, -25.4), (3.9533950563, -25.4), align=None)
    extrude(amount=F6_5_T1_DEPTH, mode=Mode.SUBTRACT)


with BuildPart() as f2h:
    # F0 (on Front) → F2, piece 8 (new body)
    with BuildSketch(Plane.XZ):
        with BuildLine():
            Line((-25.4722824507, -31.0632273567), (-3.9533950563, -9.5443399623))
            Line((-3.9533950563, -9.5443399623), (-9.5443399623, -3.9533950563))
            Line((-9.5443399623, -3.9533950563), (-31.0632273567, -25.4722824507))
            ThreePointArc((-31.0632273567, -25.4722824507), (-28.4056443956, -28.4056443956), (-25.4722824507, -31.0632273567))
        make_face()
    extrude(amount=F2_DEPTH)

    # F5#5
    f5_5_edges = [f2h.edges().sort_by_distance(p)[0] for p in [
        (-6.748868, -25.4, -6.748868),
    ]]
    chamfer(f5_5_edges, length=F5_5_SIZE)

    # F6#4: chamfer of 5.08 on 2 edges, made by hand

    # F6_4_s2 → F6_4_t1 (cut)
    with BuildSketch(Plane(origin=(-1.1032212001, 0, -1.1032212001), x_dir=(0, 1, 0), z_dir=(-0.7071067812, 0, -0.7071067812))):
        Polygon((-25.4, 1.1266049437), (-20.32, -3.9533950563), (-25.4, -3.9533950563), align=None)
    extrude(amount=F6_4_T1_DEPTH, mode=Mode.SUBTRACT)

    # F6_4_s4 → F6_4_t3 (cut)
    with BuildSketch(Plane(origin=(-37.5055036613, 0, -37.5055036613), x_dir=(0, 1, 0), z_dir=(0.7071067812, 0, 0.7071067812))):
        Polygon((-20.32, -3.9533950563), (-25.4, 1.1266049437), (-25.4, -3.9533950563), align=None)
    extrude(amount=F6_4_T3_DEPTH, mode=Mode.SUBTRACT)


with BuildPart() as f3:
    # F0 (on Front) → F3 (new body)
    with BuildSketch(Plane.XZ):
        Polygon((9.5443399623, -3.9533950563), (9.5443399623, 3.9533950563), (3.9533950563, 9.5443399623), (-3.9533950563, 9.5443399623), (-9.5443399623, 3.9533950563), (-9.5443399623, -3.9533950563), (-3.9533950563, -9.5443399623), (3.9533950563, -9.5443399623), align=None)
        with Locations((-5.6833523544, -1.5429019004)):
            Circle(F0_R_2, mode=Mode.SUBTRACT)
        with Locations((0.1435929958, -5.8873101931)):
            Circle(F0_R_2, mode=Mode.SUBTRACT)
        with Locations((5.4941160495, -2.1203134423)):
            Circle(F0_R_2, mode=Mode.SUBTRACT)
        with Locations((-2.8532490643, 5.1516997229)):
            Circle(F0_R_2, mode=Mode.SUBTRACT)
        with Locations((4.0614213794, 4.2644925416)):
            Circle(F0_R_2, mode=Mode.SUBTRACT)
    extrude(amount=F3_DEPTH)


solid = Compound([f1.part, f2.part, f2b.part, f2c.part, f2d.part, f2e.part, f2f.part, f2g.part, f2h.part, f3.part])
